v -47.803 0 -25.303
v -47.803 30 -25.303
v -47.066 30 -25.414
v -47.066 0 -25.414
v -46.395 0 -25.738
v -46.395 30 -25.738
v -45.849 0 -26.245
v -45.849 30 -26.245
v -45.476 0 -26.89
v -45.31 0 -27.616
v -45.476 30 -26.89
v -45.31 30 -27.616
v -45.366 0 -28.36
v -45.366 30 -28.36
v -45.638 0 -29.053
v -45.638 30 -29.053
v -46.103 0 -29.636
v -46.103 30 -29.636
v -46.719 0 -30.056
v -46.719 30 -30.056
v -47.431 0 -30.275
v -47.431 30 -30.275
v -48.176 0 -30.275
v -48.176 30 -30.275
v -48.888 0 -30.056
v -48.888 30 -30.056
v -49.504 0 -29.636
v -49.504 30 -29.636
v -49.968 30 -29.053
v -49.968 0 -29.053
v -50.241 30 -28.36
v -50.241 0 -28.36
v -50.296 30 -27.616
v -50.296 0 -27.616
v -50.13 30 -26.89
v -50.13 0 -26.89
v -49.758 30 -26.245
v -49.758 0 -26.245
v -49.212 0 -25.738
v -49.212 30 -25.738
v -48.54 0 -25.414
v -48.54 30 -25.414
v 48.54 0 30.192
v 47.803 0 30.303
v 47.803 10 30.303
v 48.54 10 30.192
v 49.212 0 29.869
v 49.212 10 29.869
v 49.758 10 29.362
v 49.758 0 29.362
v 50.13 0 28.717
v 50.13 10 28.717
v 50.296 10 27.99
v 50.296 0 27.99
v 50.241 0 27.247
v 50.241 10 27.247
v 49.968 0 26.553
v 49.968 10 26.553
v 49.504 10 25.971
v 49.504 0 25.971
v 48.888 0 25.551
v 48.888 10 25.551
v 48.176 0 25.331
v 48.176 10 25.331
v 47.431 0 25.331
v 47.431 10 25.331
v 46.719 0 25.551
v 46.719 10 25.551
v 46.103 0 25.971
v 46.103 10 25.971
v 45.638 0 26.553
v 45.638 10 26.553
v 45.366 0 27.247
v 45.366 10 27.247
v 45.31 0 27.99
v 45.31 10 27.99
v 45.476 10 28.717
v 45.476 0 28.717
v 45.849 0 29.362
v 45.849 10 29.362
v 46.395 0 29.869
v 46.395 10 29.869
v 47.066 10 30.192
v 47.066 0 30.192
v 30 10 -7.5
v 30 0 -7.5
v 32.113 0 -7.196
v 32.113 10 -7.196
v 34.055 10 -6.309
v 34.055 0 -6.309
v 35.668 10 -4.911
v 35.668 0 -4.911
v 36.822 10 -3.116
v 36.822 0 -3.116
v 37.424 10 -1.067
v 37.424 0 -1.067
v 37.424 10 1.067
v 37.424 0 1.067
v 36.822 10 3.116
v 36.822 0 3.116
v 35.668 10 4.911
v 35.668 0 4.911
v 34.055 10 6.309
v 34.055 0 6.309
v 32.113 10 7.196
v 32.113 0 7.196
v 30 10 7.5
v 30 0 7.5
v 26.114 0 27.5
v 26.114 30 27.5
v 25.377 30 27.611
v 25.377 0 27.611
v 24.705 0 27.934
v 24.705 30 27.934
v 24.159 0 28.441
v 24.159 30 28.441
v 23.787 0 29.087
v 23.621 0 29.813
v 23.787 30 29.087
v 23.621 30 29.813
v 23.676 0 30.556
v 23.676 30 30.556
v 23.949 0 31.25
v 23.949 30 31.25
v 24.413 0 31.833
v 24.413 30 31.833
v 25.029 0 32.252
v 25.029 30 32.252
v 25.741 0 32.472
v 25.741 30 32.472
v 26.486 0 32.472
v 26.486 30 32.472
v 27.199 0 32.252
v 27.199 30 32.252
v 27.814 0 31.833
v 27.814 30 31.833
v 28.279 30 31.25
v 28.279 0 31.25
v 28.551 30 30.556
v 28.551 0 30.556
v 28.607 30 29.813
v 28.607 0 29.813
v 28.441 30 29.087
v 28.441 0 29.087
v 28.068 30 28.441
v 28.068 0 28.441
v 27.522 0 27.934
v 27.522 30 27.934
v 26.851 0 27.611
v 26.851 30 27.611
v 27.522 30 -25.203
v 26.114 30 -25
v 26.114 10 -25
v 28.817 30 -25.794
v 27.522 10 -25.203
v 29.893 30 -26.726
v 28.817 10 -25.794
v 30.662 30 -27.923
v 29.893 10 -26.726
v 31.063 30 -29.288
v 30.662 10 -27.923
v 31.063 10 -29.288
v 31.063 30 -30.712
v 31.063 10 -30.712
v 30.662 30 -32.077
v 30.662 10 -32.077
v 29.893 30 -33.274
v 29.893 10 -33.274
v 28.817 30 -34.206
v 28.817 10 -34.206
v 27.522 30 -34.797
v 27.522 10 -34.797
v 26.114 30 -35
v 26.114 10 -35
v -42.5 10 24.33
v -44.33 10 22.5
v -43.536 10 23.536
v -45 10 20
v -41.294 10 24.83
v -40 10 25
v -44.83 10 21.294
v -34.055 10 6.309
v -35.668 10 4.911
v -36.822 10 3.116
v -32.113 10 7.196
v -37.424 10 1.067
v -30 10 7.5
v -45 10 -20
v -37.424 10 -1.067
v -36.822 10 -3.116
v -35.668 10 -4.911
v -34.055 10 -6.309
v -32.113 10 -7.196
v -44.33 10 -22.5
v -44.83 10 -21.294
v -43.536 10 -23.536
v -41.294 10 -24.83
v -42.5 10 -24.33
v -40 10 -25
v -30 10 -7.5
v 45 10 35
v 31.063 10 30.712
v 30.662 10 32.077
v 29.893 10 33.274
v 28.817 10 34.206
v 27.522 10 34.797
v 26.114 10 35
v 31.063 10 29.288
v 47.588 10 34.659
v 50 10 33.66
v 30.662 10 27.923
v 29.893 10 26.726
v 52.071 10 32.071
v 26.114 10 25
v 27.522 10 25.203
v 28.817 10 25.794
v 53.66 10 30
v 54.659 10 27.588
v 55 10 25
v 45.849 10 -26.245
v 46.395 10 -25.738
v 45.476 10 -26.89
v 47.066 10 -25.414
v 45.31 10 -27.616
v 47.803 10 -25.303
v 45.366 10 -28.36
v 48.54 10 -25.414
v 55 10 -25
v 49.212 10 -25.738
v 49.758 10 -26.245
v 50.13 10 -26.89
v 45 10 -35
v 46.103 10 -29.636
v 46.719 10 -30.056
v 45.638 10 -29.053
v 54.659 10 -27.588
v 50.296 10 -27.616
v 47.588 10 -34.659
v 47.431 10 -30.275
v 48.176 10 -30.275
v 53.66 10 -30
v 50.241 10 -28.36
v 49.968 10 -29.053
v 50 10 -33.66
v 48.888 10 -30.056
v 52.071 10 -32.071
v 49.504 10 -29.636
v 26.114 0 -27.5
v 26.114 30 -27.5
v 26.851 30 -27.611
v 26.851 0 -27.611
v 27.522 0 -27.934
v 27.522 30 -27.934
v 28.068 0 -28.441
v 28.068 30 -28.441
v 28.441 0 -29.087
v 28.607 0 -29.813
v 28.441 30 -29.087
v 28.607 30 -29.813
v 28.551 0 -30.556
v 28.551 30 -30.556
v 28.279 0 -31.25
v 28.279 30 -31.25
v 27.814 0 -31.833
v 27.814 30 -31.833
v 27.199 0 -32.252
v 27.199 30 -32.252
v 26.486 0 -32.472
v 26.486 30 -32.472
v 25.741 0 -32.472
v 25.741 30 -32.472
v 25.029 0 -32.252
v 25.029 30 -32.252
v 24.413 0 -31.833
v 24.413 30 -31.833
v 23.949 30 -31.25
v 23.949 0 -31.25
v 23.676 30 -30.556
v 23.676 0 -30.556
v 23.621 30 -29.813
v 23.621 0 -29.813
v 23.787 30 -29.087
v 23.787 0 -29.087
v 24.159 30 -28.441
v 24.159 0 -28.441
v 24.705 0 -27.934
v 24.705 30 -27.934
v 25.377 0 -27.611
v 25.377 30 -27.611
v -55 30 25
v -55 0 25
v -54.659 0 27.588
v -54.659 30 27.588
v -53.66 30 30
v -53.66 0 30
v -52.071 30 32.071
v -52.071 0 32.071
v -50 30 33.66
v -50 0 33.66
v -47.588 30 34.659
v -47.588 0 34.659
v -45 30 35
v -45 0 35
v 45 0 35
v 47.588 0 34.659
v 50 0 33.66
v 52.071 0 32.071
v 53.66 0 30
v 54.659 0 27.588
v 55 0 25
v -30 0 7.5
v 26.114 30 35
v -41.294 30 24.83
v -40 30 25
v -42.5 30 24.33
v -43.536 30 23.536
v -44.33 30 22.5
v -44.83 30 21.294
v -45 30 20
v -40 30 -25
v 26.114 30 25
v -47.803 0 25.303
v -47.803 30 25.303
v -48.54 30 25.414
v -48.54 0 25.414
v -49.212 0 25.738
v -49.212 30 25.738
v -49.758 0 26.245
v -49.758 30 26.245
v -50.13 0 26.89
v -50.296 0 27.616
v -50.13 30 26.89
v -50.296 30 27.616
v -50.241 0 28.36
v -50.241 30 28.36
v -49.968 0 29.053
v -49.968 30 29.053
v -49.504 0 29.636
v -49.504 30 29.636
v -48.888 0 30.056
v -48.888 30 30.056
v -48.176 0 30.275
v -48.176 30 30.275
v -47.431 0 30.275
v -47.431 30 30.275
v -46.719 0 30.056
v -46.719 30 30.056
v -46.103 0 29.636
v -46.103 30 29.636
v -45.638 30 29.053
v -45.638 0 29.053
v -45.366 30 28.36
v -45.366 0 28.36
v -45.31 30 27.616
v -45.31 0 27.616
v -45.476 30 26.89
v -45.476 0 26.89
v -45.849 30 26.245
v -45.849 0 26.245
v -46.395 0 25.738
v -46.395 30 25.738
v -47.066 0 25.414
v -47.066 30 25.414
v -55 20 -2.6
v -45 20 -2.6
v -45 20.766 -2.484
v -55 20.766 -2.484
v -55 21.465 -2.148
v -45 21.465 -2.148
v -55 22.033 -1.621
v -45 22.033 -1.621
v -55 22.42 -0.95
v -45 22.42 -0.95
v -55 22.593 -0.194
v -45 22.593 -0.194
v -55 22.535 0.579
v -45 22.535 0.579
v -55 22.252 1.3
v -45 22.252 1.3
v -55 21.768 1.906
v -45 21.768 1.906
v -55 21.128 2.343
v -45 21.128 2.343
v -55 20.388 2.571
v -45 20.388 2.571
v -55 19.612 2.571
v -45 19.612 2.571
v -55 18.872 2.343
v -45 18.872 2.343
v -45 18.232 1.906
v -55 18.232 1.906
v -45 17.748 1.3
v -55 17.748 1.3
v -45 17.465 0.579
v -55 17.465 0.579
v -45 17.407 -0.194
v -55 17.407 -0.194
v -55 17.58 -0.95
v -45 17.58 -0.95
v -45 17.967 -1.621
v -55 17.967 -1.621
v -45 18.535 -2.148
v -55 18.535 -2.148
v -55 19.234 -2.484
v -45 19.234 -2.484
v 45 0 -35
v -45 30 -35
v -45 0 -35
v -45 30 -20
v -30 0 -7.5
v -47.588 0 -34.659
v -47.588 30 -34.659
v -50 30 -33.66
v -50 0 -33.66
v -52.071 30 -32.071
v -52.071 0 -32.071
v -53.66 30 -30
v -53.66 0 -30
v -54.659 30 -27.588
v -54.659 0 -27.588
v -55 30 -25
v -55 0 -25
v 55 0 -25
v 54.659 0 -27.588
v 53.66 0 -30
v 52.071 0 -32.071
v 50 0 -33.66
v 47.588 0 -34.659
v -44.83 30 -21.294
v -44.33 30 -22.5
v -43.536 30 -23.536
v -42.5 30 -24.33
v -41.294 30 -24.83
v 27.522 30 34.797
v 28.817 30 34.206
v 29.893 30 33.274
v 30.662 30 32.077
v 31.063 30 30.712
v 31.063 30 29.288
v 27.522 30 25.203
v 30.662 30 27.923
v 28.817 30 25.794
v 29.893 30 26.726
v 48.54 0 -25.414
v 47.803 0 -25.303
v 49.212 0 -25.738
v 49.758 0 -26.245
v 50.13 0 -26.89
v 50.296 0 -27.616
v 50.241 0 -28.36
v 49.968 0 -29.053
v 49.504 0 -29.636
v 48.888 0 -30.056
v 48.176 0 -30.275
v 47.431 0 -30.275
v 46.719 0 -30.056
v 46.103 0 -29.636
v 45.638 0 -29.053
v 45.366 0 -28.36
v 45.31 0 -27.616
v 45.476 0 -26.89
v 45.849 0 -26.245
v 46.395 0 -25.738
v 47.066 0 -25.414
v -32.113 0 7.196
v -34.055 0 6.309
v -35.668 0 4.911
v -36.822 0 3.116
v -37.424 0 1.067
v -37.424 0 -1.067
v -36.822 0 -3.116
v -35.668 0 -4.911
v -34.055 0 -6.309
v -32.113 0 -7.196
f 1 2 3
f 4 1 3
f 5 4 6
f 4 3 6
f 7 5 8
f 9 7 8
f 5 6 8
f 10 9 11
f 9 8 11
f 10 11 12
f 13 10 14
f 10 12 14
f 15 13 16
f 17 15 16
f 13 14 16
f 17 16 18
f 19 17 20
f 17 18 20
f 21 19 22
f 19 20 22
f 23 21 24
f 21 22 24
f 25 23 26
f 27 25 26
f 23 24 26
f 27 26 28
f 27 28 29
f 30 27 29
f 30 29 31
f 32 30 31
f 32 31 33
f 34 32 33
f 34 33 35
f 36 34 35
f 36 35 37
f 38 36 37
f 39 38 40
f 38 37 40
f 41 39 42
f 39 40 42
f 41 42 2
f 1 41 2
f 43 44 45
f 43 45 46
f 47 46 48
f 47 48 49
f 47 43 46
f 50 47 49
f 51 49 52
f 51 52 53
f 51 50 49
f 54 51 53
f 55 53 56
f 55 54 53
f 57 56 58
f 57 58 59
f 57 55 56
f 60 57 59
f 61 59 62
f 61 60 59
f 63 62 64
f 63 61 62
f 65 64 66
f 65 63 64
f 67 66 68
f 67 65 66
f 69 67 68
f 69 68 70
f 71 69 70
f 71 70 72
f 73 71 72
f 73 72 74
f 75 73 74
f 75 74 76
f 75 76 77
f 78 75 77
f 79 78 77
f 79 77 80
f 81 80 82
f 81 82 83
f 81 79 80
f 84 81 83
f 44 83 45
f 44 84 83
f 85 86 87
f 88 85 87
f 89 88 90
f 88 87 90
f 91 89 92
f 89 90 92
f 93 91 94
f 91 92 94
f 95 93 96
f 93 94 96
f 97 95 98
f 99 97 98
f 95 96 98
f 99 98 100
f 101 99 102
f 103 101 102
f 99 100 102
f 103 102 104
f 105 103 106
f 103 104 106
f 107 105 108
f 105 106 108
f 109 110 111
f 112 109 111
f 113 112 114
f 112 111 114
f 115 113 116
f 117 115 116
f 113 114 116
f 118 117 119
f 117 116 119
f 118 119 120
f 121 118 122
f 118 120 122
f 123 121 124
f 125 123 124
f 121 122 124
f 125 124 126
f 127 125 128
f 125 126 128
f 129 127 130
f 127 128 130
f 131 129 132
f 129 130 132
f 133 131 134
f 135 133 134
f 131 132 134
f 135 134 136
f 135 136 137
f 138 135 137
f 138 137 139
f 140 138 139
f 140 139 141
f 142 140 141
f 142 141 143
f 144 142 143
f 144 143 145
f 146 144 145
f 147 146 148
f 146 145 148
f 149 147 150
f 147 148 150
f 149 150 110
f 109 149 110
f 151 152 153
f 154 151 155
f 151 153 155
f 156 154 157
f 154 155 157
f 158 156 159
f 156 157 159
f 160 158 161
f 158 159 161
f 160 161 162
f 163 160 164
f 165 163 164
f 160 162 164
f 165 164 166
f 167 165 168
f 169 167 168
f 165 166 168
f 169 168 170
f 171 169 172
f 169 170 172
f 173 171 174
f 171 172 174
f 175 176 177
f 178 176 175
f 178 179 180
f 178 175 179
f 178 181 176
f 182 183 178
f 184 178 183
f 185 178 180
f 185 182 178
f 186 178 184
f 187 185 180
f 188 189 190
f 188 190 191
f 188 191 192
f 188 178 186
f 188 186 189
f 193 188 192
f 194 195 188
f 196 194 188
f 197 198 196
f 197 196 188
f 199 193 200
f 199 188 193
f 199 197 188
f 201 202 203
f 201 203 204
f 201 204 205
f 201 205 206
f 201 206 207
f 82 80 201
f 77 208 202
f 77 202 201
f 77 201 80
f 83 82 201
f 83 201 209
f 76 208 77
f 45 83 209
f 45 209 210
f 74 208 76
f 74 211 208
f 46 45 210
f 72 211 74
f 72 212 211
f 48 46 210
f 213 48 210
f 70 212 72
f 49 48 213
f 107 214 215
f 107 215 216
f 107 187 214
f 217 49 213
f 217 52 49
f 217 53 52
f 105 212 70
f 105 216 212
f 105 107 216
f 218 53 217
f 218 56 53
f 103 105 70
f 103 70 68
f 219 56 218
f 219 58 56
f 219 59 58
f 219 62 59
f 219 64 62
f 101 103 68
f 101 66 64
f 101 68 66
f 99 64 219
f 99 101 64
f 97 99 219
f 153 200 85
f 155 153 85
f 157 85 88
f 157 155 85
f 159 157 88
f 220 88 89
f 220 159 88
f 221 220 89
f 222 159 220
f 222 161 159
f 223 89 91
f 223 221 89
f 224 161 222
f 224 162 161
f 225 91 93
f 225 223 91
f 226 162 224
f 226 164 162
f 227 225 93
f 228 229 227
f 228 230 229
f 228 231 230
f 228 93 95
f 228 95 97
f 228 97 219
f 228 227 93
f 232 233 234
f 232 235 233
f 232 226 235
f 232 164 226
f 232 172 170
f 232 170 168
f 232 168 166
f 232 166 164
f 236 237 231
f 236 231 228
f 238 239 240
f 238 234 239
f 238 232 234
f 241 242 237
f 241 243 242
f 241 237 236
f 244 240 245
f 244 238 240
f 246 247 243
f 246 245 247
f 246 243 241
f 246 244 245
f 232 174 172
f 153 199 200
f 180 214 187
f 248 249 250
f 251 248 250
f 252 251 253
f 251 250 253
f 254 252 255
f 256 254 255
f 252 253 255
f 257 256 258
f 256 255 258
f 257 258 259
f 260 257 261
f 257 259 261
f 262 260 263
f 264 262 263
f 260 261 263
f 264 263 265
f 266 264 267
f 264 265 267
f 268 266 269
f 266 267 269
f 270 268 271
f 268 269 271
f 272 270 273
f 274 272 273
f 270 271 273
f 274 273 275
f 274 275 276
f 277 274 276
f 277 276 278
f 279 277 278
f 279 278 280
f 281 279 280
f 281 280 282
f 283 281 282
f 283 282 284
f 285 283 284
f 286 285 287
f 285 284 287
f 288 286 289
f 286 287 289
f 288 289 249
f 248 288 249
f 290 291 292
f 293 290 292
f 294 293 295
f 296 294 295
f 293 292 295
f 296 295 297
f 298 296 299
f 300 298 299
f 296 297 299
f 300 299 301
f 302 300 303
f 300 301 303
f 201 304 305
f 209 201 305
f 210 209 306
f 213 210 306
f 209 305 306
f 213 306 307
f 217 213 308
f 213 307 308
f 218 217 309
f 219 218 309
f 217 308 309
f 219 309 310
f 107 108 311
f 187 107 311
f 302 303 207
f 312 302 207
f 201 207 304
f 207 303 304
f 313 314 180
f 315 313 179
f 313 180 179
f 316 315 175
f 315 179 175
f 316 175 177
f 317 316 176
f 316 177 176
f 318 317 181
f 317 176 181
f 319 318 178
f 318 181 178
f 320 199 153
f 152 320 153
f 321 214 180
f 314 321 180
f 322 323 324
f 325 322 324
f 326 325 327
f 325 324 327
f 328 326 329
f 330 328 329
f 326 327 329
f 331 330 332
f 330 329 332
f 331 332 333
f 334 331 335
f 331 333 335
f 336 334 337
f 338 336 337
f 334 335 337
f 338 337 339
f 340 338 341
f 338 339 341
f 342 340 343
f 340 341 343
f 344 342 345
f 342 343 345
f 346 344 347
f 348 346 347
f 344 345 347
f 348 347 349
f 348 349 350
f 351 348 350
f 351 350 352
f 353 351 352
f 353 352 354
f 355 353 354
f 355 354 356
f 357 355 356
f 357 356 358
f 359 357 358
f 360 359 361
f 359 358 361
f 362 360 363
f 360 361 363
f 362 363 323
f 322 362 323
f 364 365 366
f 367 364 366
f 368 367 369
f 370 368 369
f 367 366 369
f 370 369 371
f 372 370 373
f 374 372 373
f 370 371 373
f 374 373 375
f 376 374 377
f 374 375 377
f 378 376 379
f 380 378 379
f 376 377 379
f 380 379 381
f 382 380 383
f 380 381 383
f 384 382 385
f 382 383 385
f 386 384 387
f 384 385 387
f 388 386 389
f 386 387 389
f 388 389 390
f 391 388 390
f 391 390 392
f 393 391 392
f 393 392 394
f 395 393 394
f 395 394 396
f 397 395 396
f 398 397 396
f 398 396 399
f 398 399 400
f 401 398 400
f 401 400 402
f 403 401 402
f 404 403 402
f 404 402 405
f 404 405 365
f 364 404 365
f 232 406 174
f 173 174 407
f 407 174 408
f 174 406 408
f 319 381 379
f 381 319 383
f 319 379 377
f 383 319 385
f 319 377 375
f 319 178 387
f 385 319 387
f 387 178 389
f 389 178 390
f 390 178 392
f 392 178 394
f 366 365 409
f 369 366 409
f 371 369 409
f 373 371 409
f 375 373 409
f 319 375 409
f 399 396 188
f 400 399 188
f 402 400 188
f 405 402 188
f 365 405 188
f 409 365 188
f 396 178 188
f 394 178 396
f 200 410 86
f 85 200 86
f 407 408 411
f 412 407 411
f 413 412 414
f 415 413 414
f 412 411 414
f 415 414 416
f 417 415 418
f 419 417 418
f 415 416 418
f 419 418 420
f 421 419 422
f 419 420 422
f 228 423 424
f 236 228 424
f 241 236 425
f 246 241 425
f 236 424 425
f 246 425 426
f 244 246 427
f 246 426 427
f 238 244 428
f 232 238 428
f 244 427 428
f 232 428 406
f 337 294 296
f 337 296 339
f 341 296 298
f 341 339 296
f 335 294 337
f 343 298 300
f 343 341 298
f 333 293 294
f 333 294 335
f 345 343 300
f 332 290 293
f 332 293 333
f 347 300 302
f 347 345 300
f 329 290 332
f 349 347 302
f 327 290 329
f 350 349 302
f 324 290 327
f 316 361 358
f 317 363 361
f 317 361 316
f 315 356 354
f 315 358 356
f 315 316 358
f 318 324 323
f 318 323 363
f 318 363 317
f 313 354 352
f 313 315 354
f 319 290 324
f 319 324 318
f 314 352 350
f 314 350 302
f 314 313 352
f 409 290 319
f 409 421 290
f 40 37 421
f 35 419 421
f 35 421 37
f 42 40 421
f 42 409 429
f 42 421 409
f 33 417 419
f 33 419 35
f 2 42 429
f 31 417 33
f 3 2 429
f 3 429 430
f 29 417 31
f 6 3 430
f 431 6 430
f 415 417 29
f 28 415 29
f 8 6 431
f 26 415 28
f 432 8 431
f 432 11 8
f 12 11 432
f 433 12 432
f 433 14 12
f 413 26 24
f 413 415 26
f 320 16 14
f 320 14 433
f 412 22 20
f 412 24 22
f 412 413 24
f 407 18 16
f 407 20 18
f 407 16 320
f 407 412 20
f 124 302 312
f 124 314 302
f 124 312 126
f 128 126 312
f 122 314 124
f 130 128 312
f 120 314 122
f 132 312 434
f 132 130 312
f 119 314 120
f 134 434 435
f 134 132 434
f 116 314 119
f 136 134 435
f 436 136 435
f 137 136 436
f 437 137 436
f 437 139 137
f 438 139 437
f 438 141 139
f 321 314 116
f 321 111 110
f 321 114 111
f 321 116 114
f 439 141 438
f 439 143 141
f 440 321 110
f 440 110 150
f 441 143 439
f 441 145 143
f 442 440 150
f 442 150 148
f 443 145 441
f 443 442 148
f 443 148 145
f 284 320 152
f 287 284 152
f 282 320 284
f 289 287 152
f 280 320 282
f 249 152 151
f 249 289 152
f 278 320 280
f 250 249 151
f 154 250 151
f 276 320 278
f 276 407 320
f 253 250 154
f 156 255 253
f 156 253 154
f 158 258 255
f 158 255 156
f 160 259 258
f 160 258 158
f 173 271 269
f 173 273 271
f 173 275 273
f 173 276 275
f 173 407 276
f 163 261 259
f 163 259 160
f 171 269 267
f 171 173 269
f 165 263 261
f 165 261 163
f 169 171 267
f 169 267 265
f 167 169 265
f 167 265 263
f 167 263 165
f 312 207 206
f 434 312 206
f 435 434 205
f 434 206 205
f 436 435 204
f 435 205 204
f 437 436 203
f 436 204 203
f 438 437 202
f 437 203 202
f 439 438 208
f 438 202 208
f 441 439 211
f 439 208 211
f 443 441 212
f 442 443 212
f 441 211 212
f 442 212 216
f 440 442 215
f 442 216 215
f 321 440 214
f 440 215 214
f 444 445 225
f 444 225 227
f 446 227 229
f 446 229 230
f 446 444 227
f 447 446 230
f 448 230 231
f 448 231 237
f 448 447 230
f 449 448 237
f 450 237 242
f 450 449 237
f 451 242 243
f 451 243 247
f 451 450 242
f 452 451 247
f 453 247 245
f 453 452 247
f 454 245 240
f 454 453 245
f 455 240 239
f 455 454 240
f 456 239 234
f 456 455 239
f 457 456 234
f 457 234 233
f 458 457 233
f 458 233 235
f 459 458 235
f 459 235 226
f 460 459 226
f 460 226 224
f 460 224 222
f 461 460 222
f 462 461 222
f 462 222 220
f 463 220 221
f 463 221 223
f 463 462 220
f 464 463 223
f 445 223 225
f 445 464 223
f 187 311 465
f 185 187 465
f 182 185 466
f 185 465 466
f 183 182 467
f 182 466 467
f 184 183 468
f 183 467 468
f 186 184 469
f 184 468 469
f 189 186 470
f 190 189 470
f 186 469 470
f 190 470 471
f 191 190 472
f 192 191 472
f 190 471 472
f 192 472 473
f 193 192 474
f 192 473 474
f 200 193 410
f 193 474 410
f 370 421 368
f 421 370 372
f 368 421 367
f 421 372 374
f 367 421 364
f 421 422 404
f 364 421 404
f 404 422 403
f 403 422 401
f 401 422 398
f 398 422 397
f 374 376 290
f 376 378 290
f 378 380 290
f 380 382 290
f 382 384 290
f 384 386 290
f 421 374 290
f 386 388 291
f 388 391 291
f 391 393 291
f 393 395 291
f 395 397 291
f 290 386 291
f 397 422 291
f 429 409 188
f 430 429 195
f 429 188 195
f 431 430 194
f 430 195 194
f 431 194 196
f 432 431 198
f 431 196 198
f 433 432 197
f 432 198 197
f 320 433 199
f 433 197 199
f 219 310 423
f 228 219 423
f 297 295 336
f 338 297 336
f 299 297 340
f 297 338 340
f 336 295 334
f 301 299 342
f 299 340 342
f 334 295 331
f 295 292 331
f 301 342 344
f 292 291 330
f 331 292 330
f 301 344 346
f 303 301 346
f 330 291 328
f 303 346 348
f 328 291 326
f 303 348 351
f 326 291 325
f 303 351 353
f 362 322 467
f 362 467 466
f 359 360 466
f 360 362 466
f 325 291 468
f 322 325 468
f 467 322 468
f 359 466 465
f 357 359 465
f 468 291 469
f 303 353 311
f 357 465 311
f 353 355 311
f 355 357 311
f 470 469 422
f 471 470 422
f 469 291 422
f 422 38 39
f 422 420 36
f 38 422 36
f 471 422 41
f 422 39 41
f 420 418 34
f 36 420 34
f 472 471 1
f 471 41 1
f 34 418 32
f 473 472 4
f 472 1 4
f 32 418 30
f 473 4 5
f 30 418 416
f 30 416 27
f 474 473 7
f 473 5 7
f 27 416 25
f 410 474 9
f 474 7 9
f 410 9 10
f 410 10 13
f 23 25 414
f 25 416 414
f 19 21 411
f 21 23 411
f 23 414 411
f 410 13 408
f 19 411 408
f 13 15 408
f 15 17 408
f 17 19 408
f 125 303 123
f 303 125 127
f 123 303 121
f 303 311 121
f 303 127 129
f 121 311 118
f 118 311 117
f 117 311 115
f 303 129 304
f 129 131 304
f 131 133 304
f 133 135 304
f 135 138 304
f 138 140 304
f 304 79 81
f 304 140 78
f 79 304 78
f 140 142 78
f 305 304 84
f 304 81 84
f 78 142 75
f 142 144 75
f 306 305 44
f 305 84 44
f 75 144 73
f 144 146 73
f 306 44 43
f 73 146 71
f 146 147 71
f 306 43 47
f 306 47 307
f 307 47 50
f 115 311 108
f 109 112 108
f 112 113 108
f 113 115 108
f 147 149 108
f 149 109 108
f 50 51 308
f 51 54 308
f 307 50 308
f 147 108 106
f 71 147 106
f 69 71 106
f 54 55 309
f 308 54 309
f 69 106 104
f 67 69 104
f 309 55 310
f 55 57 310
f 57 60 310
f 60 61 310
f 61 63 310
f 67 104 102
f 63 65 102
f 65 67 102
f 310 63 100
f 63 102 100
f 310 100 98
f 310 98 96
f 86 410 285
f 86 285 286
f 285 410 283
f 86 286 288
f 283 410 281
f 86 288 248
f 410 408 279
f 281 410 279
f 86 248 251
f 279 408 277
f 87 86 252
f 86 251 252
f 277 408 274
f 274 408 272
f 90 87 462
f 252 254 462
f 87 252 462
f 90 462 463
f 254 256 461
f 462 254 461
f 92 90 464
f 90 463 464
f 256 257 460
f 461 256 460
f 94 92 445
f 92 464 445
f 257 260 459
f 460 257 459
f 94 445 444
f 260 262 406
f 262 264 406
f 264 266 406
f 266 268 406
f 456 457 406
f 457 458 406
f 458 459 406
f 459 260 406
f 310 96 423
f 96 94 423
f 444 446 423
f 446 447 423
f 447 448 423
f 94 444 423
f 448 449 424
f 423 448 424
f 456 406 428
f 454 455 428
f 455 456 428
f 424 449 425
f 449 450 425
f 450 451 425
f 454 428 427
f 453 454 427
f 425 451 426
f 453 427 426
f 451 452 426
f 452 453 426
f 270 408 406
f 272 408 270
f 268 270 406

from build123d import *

# Parameters (mm, degrees)
SKETCH1_R           = 2.5
BOSS_EXTRUDE1_DEPTH = 10
BOSS_EXTRUDE2_DEPTH = 30
SKETCH3_R           = 2.5
CUT_EXTRUDE1_DEPTH  = 30
SKETCH6_R           = 2.6
CUT_EXTRUDE3_DEPTH  = 11


with BuildPart() as part:
    # Sketch1 → Boss-Extrude1 (new body)
    with BuildSketch(Plane(origin=(0, 0, 0), x_dir=(1, 0, 0), z_dir=(0, 1, 0))):
        with BuildLine():
            ThreePointArc((-45, 35), (-52.071067812, 32.071067812), (-55, 25))
            Line((-55, 25), (-55, -25))
            ThreePointArc((-55, -25), (-52.071067812, -32.071067812), (-45, -35))
            Line((-45, -35), (45, -35))
            ThreePointArc((45, -35), (52.071067812, -32.071067812), (55, -25))
            Line((55, -25), (55, 25))
            ThreePointArc((55, 25), (52.071067812, 32.071067812), (45, 35))
            Line((45, 35), (-45, 35))
        make_face()
        with BuildLine():
            Line((-30, 7.5), (30, 7.5))
            ThreePointArc((30, 7.5), (37.5, 0), (30, -7.5))
            Line((30, -7.5), (-30, -7.5))
            ThreePointArc((-30, -7.5), (-37.5, 0), (-30, 7.5))
        make_face(mode=Mode.SUBTRACT)
        with Locations((47.803300859, -27.803300859)):
            Circle(SKETCH1_R, mode=Mode.SUBTRACT)
        with Locations((47.803300859, 27.803300859)):
            Circle(SKETCH1_R, mode=Mode.SUBTRACT)
    extrude(amount=BOSS_EXTRUDE1_DEPTH)

    # Sketch1<6> → Boss-Extrude2 (add)
    with BuildSketch(Plane(origin=(0, 0, 0), x_dir=(1, 0, 0), z_dir=(0, 1, 0))):
        with BuildLine():
            Line((26.113792714, 35), (-45, 35))
            ThreePointArc((-45, 35), (-52.071067812, 32.071067812), (-55, 25))
            Line((-55, 25), (-55, -25))
            ThreePointArc((-55, -25), (-52.071067812, -32.071067812), (-45, -35))
            Line((-45, -35), (26.113792684, -35))
            ThreePointArc((26.113792684, -35), (31.113792714, -30.000000008), (26.1137927, -25))
            Line((26.1137927, -25), (-40, -25))
            ThreePointArc((-40, -25), (-43.535533906, -23.535533906), (-45, -20))
            Line((-45, -20), (-45, 20))
            ThreePointArc((-45, 20), (-43.535533906, 23.535533906), (-40, 25))
            Line((-40, 25), (26.113792714, 25))
            ThreePointArc((26.113792714, 25), (31.113792714, 30), (26.113792714, 35))
        make_face()
    extrude(amount=BOSS_EXTRUDE2_DEPTH)

    # Sketch3 → Cut-Extrude1 (cut)
    with BuildSketch(Plane(origin=(0, 30, 0), x_dir=(1, 0, 0), z_dir=(0, 1, 0))):
        with Locations((-47.803300859, 27.803300859)):
            Circle(SKETCH3_R)
        with Locations((-47.803300859, -27.803300859)):
            Circle(SKETCH3_R)
        with Locations((26.113792714, 30)):
            Circle(SKETCH3_R)
        with Locations((26.113792714, -30)):
            Circle(SKETCH3_R)
    extrude(amount=-CUT_EXTRUDE1_DEPTH, mode=Mode.SUBTRACT)

    # Sketch6 → Cut-Extrude3 (cut)
    with BuildSketch(Plane(origin=(-45, 0, 0), x_dir=(0, 0, -1), z_dir=(1, 0, 0))):
        with Locations((0, 20)):
            Circle(SKETCH6_R)
    extrude(amount=-CUT_EXTRUDE3_DEPTH, mode=Mode.SUBTRACT)


solid = part.part
